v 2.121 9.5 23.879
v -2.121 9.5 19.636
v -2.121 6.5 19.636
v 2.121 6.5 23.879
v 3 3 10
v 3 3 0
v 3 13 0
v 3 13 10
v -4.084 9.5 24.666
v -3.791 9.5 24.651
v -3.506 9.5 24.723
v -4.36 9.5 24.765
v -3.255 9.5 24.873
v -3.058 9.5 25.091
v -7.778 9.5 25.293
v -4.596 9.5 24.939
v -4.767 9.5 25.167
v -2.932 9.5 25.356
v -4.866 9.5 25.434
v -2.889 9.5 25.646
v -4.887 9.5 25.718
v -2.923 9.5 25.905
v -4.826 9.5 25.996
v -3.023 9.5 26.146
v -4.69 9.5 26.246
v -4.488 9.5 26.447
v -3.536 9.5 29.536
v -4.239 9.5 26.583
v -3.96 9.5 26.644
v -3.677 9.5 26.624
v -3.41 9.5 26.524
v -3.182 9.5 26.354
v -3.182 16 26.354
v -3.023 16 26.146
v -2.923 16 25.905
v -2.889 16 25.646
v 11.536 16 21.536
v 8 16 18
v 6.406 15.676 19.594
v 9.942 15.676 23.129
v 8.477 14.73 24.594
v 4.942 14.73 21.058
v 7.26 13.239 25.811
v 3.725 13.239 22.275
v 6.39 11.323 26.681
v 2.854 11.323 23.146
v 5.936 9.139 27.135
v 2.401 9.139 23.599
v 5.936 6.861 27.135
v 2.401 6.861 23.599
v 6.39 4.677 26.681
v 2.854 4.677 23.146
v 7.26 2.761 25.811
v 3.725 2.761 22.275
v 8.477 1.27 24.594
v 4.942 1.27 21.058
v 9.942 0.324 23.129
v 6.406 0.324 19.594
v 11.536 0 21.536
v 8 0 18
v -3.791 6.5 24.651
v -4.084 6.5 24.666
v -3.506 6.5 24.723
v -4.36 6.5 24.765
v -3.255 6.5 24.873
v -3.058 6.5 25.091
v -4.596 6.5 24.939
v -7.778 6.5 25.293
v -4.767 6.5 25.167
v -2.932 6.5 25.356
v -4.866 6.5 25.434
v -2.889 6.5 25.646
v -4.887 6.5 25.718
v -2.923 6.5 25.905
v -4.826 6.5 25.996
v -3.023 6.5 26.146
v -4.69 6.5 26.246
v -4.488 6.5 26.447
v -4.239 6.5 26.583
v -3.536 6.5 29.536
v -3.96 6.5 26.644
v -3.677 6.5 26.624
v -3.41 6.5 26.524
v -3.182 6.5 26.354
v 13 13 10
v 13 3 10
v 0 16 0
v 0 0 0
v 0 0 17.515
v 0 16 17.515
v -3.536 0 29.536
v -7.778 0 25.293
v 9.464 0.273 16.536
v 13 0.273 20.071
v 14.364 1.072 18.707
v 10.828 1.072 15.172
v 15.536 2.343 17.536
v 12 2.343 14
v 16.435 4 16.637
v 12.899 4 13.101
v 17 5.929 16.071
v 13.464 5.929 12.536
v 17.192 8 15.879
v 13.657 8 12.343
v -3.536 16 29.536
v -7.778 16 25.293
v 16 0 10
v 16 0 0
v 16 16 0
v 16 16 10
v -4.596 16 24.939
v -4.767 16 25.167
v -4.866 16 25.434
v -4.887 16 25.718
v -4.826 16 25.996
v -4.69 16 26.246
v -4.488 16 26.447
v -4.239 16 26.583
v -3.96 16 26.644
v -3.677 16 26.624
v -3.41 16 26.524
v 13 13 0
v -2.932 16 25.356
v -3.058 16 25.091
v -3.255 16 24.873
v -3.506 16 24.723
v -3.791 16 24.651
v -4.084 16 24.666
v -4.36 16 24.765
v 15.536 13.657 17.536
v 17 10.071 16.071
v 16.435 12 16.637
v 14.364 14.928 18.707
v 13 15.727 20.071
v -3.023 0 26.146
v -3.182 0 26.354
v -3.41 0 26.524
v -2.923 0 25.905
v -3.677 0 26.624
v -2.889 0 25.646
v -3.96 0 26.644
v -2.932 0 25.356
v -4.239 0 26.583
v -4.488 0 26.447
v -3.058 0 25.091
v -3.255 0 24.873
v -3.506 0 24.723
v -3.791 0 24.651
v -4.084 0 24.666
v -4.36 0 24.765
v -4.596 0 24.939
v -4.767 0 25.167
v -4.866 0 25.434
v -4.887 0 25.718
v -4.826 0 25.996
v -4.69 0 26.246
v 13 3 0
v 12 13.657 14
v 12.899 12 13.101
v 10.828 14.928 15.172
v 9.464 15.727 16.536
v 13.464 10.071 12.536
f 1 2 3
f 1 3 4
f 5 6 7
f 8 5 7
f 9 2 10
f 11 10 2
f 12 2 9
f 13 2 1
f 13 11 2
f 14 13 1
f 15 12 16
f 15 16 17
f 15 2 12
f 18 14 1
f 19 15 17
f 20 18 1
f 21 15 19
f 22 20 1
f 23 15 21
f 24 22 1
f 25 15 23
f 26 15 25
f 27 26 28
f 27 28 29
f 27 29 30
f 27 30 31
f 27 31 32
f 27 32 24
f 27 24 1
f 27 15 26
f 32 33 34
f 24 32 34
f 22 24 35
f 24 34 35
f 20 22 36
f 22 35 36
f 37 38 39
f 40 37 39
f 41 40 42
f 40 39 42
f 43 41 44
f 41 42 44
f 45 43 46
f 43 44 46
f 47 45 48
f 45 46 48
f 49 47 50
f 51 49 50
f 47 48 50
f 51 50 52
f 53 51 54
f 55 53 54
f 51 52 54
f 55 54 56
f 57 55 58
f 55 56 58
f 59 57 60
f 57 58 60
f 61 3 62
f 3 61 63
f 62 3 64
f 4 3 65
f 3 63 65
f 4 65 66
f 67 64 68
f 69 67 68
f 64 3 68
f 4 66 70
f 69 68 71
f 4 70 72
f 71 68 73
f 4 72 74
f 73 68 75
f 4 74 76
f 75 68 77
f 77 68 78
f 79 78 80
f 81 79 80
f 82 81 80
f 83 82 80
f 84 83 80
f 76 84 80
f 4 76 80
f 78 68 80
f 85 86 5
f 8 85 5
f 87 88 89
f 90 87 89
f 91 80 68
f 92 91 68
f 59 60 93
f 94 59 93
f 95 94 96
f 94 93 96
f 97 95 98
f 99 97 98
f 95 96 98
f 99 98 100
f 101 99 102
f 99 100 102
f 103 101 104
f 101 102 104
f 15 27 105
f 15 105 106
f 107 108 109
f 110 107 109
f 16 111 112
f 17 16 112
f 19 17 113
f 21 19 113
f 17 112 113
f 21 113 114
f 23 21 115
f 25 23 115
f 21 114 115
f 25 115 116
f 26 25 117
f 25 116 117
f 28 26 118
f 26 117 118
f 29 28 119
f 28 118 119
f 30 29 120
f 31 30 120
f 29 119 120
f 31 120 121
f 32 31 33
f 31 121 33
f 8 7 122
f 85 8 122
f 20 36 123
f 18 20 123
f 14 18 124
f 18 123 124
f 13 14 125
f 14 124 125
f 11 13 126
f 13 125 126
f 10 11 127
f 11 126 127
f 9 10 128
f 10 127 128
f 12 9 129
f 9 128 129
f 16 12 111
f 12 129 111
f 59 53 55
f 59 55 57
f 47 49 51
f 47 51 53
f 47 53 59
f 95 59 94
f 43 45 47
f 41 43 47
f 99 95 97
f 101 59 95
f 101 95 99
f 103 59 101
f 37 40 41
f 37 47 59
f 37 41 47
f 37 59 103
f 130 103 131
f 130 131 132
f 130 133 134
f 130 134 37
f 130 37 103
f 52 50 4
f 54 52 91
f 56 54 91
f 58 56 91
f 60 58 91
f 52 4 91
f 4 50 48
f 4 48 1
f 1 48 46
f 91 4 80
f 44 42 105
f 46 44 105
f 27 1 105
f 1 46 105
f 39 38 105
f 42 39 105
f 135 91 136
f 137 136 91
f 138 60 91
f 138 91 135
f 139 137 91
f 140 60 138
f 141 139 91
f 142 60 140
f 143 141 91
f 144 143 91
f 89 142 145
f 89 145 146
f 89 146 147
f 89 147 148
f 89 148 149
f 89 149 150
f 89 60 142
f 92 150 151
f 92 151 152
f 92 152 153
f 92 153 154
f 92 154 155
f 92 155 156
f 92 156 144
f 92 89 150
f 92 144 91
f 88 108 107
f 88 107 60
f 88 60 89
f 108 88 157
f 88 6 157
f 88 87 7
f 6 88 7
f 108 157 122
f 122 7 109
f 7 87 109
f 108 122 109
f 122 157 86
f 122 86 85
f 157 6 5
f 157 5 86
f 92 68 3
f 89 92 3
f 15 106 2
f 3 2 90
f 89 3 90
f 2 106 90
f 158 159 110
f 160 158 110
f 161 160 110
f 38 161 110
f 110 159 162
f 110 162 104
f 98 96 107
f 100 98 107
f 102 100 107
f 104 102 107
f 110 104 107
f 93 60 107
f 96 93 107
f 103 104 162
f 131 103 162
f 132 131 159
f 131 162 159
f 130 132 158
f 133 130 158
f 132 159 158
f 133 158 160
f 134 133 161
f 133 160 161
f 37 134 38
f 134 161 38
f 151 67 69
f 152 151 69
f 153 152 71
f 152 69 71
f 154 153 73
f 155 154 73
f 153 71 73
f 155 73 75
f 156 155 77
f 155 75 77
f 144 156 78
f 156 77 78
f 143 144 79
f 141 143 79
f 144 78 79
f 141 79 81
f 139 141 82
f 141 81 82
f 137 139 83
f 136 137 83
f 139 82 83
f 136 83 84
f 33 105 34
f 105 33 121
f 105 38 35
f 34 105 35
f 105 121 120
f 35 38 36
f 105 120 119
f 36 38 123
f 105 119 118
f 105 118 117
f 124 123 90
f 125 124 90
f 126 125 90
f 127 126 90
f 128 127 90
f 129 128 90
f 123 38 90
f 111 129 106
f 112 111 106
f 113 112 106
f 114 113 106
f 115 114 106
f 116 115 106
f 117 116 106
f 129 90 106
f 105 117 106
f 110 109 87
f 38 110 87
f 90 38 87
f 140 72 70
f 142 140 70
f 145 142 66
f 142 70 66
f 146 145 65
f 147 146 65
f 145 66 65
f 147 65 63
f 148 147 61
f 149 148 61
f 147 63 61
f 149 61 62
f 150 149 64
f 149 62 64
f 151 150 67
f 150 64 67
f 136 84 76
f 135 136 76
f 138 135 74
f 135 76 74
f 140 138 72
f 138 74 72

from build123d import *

# Parameters (mm, degrees)
SKETCH_1_W          = 16
SKETCH_1_H          = 16
SKETCH_1_W_2        = 10
SKETCH_1_H_2        = 10
EXTRUDE_1_DEPTH     = 10
EXTRUDE_2_DEPTH     = 16
EXTRUDE_3_DEPTH     = 5
EXTRUDE_5_DEPTH     = 16
SKETCH_12_W         = 6
SKETCH_12_H         = 3
CUT_EXTRUDE_2_DEPTH = 8
CUT_EXTRUDE_3_DEPTH = 16


with BuildPart() as part:
    # 草图1 → 凸台-拉伸1 (new body)
    with BuildSketch(Plane.XY):
        with Locations((8, 8)):
            Rectangle(SKETCH_1_W, SKETCH_1_H)
        with Locations((8, 8)):
            Rectangle(SKETCH_1_W_2, SKETCH_1_H_2, mode=Mode.SUBTRACT)
    extrude(amount=EXTRUDE_1_DEPTH)

    # 草图2 → 凸台-拉伸2 (add)
    with BuildSketch(Plane.XZ):
        Polygon((0, 10), (0, 26), (16, 10), align=None)
    extrude(amount=-EXTRUDE_2_DEPTH)

    # 草图6 → 凸台-拉伸3 (add)
    with BuildSketch(Plane(origin=(13, 0, 13), x_dir=(0.7071067811865475, 0, -0.7071067811865477), z_dir=(0.7071067811865477, 0, 0.7071067811865475))):
        with BuildLine():
            ThreePointArc((-7.071067812, 16), (-15.071067812, 8), (-7.071067812, 0))
            Line((-7.071067812, 0), (-7.071067812, 16))
        make_face()
        with BuildLine():
            Line((-7.071067812, 16), (-7.071067812, 0))
            ThreePointArc((-7.071067812, 0), (-1.414213562, 2.343145751), (0.928932188, 8))
            ThreePointArc((0.928932188, 8), (-1.414213562, 13.656854249), (-7.071067812, 16))
        make_face()
    extrude(amount=EXTRUDE_3_DEPTH)

    # 草图10 → 凸台-拉伸5 (add)
    with BuildSketch(Plane(origin=(0, 16, 0), x_dir=(1, 0, 0), z_dir=(0, 1, 0))):
        Polygon((0, -26), (-3.535533906, -29.535533906), (-7.778174593, -25.292893219), (0, -17.514718626), align=None)
    extrude(amount=-EXTRUDE_5_DEPTH)

    # 草图12 → 切除-拉伸2 (cut)
    with BuildSketch(Plane(origin=(-16.535533906, 0, 16.535533906), x_dir=(0.7071067811865475, 0, 0.7071067811865477), z_dir=(-0.7071067811865477, 0, 0.7071067811865475))):
        with Locations((15.384776311, 8)):
            Rectangle(SKETCH_12_W, SKETCH_12_H)
    extrude(amount=-CUT_EXTRUDE_2_DEPTH, mode=Mode.SUBTRACT)

    # 草图13 → 切除-拉伸3 (cut)
    with BuildSketch(Plane(origin=(0, 16, 0), x_dir=(1, 0, 0), z_dir=(0, 1, 0))):
        with BuildLine():
            ThreePointArc((-4.596194078, -24.939339828), (-4.596194078, -26.353553391), (-3.181980515, -26.353553391))
            Line((-3.181980515, -26.353553391), (-4.596194078, -24.939339828))
        make_face()
        with BuildLine():
            Line((-4.596194078, -24.939339828), (-3.181980515, -26.353553391))
            ThreePointArc((-3.181980515, -26.353553391), (-2.965207764, -26.029130042), (-2.889087297, -25.646446609))
            ThreePointArc((-2.889087297, -25.646446609), (-3.506403864, -24.722567077), (-4.596194078, -24.939339828))
        make_face()
    extrude(amount=-CUT_EXTRUDE_3_DEPTH, mode=Mode.SUBTRACT)


solid = part.part
